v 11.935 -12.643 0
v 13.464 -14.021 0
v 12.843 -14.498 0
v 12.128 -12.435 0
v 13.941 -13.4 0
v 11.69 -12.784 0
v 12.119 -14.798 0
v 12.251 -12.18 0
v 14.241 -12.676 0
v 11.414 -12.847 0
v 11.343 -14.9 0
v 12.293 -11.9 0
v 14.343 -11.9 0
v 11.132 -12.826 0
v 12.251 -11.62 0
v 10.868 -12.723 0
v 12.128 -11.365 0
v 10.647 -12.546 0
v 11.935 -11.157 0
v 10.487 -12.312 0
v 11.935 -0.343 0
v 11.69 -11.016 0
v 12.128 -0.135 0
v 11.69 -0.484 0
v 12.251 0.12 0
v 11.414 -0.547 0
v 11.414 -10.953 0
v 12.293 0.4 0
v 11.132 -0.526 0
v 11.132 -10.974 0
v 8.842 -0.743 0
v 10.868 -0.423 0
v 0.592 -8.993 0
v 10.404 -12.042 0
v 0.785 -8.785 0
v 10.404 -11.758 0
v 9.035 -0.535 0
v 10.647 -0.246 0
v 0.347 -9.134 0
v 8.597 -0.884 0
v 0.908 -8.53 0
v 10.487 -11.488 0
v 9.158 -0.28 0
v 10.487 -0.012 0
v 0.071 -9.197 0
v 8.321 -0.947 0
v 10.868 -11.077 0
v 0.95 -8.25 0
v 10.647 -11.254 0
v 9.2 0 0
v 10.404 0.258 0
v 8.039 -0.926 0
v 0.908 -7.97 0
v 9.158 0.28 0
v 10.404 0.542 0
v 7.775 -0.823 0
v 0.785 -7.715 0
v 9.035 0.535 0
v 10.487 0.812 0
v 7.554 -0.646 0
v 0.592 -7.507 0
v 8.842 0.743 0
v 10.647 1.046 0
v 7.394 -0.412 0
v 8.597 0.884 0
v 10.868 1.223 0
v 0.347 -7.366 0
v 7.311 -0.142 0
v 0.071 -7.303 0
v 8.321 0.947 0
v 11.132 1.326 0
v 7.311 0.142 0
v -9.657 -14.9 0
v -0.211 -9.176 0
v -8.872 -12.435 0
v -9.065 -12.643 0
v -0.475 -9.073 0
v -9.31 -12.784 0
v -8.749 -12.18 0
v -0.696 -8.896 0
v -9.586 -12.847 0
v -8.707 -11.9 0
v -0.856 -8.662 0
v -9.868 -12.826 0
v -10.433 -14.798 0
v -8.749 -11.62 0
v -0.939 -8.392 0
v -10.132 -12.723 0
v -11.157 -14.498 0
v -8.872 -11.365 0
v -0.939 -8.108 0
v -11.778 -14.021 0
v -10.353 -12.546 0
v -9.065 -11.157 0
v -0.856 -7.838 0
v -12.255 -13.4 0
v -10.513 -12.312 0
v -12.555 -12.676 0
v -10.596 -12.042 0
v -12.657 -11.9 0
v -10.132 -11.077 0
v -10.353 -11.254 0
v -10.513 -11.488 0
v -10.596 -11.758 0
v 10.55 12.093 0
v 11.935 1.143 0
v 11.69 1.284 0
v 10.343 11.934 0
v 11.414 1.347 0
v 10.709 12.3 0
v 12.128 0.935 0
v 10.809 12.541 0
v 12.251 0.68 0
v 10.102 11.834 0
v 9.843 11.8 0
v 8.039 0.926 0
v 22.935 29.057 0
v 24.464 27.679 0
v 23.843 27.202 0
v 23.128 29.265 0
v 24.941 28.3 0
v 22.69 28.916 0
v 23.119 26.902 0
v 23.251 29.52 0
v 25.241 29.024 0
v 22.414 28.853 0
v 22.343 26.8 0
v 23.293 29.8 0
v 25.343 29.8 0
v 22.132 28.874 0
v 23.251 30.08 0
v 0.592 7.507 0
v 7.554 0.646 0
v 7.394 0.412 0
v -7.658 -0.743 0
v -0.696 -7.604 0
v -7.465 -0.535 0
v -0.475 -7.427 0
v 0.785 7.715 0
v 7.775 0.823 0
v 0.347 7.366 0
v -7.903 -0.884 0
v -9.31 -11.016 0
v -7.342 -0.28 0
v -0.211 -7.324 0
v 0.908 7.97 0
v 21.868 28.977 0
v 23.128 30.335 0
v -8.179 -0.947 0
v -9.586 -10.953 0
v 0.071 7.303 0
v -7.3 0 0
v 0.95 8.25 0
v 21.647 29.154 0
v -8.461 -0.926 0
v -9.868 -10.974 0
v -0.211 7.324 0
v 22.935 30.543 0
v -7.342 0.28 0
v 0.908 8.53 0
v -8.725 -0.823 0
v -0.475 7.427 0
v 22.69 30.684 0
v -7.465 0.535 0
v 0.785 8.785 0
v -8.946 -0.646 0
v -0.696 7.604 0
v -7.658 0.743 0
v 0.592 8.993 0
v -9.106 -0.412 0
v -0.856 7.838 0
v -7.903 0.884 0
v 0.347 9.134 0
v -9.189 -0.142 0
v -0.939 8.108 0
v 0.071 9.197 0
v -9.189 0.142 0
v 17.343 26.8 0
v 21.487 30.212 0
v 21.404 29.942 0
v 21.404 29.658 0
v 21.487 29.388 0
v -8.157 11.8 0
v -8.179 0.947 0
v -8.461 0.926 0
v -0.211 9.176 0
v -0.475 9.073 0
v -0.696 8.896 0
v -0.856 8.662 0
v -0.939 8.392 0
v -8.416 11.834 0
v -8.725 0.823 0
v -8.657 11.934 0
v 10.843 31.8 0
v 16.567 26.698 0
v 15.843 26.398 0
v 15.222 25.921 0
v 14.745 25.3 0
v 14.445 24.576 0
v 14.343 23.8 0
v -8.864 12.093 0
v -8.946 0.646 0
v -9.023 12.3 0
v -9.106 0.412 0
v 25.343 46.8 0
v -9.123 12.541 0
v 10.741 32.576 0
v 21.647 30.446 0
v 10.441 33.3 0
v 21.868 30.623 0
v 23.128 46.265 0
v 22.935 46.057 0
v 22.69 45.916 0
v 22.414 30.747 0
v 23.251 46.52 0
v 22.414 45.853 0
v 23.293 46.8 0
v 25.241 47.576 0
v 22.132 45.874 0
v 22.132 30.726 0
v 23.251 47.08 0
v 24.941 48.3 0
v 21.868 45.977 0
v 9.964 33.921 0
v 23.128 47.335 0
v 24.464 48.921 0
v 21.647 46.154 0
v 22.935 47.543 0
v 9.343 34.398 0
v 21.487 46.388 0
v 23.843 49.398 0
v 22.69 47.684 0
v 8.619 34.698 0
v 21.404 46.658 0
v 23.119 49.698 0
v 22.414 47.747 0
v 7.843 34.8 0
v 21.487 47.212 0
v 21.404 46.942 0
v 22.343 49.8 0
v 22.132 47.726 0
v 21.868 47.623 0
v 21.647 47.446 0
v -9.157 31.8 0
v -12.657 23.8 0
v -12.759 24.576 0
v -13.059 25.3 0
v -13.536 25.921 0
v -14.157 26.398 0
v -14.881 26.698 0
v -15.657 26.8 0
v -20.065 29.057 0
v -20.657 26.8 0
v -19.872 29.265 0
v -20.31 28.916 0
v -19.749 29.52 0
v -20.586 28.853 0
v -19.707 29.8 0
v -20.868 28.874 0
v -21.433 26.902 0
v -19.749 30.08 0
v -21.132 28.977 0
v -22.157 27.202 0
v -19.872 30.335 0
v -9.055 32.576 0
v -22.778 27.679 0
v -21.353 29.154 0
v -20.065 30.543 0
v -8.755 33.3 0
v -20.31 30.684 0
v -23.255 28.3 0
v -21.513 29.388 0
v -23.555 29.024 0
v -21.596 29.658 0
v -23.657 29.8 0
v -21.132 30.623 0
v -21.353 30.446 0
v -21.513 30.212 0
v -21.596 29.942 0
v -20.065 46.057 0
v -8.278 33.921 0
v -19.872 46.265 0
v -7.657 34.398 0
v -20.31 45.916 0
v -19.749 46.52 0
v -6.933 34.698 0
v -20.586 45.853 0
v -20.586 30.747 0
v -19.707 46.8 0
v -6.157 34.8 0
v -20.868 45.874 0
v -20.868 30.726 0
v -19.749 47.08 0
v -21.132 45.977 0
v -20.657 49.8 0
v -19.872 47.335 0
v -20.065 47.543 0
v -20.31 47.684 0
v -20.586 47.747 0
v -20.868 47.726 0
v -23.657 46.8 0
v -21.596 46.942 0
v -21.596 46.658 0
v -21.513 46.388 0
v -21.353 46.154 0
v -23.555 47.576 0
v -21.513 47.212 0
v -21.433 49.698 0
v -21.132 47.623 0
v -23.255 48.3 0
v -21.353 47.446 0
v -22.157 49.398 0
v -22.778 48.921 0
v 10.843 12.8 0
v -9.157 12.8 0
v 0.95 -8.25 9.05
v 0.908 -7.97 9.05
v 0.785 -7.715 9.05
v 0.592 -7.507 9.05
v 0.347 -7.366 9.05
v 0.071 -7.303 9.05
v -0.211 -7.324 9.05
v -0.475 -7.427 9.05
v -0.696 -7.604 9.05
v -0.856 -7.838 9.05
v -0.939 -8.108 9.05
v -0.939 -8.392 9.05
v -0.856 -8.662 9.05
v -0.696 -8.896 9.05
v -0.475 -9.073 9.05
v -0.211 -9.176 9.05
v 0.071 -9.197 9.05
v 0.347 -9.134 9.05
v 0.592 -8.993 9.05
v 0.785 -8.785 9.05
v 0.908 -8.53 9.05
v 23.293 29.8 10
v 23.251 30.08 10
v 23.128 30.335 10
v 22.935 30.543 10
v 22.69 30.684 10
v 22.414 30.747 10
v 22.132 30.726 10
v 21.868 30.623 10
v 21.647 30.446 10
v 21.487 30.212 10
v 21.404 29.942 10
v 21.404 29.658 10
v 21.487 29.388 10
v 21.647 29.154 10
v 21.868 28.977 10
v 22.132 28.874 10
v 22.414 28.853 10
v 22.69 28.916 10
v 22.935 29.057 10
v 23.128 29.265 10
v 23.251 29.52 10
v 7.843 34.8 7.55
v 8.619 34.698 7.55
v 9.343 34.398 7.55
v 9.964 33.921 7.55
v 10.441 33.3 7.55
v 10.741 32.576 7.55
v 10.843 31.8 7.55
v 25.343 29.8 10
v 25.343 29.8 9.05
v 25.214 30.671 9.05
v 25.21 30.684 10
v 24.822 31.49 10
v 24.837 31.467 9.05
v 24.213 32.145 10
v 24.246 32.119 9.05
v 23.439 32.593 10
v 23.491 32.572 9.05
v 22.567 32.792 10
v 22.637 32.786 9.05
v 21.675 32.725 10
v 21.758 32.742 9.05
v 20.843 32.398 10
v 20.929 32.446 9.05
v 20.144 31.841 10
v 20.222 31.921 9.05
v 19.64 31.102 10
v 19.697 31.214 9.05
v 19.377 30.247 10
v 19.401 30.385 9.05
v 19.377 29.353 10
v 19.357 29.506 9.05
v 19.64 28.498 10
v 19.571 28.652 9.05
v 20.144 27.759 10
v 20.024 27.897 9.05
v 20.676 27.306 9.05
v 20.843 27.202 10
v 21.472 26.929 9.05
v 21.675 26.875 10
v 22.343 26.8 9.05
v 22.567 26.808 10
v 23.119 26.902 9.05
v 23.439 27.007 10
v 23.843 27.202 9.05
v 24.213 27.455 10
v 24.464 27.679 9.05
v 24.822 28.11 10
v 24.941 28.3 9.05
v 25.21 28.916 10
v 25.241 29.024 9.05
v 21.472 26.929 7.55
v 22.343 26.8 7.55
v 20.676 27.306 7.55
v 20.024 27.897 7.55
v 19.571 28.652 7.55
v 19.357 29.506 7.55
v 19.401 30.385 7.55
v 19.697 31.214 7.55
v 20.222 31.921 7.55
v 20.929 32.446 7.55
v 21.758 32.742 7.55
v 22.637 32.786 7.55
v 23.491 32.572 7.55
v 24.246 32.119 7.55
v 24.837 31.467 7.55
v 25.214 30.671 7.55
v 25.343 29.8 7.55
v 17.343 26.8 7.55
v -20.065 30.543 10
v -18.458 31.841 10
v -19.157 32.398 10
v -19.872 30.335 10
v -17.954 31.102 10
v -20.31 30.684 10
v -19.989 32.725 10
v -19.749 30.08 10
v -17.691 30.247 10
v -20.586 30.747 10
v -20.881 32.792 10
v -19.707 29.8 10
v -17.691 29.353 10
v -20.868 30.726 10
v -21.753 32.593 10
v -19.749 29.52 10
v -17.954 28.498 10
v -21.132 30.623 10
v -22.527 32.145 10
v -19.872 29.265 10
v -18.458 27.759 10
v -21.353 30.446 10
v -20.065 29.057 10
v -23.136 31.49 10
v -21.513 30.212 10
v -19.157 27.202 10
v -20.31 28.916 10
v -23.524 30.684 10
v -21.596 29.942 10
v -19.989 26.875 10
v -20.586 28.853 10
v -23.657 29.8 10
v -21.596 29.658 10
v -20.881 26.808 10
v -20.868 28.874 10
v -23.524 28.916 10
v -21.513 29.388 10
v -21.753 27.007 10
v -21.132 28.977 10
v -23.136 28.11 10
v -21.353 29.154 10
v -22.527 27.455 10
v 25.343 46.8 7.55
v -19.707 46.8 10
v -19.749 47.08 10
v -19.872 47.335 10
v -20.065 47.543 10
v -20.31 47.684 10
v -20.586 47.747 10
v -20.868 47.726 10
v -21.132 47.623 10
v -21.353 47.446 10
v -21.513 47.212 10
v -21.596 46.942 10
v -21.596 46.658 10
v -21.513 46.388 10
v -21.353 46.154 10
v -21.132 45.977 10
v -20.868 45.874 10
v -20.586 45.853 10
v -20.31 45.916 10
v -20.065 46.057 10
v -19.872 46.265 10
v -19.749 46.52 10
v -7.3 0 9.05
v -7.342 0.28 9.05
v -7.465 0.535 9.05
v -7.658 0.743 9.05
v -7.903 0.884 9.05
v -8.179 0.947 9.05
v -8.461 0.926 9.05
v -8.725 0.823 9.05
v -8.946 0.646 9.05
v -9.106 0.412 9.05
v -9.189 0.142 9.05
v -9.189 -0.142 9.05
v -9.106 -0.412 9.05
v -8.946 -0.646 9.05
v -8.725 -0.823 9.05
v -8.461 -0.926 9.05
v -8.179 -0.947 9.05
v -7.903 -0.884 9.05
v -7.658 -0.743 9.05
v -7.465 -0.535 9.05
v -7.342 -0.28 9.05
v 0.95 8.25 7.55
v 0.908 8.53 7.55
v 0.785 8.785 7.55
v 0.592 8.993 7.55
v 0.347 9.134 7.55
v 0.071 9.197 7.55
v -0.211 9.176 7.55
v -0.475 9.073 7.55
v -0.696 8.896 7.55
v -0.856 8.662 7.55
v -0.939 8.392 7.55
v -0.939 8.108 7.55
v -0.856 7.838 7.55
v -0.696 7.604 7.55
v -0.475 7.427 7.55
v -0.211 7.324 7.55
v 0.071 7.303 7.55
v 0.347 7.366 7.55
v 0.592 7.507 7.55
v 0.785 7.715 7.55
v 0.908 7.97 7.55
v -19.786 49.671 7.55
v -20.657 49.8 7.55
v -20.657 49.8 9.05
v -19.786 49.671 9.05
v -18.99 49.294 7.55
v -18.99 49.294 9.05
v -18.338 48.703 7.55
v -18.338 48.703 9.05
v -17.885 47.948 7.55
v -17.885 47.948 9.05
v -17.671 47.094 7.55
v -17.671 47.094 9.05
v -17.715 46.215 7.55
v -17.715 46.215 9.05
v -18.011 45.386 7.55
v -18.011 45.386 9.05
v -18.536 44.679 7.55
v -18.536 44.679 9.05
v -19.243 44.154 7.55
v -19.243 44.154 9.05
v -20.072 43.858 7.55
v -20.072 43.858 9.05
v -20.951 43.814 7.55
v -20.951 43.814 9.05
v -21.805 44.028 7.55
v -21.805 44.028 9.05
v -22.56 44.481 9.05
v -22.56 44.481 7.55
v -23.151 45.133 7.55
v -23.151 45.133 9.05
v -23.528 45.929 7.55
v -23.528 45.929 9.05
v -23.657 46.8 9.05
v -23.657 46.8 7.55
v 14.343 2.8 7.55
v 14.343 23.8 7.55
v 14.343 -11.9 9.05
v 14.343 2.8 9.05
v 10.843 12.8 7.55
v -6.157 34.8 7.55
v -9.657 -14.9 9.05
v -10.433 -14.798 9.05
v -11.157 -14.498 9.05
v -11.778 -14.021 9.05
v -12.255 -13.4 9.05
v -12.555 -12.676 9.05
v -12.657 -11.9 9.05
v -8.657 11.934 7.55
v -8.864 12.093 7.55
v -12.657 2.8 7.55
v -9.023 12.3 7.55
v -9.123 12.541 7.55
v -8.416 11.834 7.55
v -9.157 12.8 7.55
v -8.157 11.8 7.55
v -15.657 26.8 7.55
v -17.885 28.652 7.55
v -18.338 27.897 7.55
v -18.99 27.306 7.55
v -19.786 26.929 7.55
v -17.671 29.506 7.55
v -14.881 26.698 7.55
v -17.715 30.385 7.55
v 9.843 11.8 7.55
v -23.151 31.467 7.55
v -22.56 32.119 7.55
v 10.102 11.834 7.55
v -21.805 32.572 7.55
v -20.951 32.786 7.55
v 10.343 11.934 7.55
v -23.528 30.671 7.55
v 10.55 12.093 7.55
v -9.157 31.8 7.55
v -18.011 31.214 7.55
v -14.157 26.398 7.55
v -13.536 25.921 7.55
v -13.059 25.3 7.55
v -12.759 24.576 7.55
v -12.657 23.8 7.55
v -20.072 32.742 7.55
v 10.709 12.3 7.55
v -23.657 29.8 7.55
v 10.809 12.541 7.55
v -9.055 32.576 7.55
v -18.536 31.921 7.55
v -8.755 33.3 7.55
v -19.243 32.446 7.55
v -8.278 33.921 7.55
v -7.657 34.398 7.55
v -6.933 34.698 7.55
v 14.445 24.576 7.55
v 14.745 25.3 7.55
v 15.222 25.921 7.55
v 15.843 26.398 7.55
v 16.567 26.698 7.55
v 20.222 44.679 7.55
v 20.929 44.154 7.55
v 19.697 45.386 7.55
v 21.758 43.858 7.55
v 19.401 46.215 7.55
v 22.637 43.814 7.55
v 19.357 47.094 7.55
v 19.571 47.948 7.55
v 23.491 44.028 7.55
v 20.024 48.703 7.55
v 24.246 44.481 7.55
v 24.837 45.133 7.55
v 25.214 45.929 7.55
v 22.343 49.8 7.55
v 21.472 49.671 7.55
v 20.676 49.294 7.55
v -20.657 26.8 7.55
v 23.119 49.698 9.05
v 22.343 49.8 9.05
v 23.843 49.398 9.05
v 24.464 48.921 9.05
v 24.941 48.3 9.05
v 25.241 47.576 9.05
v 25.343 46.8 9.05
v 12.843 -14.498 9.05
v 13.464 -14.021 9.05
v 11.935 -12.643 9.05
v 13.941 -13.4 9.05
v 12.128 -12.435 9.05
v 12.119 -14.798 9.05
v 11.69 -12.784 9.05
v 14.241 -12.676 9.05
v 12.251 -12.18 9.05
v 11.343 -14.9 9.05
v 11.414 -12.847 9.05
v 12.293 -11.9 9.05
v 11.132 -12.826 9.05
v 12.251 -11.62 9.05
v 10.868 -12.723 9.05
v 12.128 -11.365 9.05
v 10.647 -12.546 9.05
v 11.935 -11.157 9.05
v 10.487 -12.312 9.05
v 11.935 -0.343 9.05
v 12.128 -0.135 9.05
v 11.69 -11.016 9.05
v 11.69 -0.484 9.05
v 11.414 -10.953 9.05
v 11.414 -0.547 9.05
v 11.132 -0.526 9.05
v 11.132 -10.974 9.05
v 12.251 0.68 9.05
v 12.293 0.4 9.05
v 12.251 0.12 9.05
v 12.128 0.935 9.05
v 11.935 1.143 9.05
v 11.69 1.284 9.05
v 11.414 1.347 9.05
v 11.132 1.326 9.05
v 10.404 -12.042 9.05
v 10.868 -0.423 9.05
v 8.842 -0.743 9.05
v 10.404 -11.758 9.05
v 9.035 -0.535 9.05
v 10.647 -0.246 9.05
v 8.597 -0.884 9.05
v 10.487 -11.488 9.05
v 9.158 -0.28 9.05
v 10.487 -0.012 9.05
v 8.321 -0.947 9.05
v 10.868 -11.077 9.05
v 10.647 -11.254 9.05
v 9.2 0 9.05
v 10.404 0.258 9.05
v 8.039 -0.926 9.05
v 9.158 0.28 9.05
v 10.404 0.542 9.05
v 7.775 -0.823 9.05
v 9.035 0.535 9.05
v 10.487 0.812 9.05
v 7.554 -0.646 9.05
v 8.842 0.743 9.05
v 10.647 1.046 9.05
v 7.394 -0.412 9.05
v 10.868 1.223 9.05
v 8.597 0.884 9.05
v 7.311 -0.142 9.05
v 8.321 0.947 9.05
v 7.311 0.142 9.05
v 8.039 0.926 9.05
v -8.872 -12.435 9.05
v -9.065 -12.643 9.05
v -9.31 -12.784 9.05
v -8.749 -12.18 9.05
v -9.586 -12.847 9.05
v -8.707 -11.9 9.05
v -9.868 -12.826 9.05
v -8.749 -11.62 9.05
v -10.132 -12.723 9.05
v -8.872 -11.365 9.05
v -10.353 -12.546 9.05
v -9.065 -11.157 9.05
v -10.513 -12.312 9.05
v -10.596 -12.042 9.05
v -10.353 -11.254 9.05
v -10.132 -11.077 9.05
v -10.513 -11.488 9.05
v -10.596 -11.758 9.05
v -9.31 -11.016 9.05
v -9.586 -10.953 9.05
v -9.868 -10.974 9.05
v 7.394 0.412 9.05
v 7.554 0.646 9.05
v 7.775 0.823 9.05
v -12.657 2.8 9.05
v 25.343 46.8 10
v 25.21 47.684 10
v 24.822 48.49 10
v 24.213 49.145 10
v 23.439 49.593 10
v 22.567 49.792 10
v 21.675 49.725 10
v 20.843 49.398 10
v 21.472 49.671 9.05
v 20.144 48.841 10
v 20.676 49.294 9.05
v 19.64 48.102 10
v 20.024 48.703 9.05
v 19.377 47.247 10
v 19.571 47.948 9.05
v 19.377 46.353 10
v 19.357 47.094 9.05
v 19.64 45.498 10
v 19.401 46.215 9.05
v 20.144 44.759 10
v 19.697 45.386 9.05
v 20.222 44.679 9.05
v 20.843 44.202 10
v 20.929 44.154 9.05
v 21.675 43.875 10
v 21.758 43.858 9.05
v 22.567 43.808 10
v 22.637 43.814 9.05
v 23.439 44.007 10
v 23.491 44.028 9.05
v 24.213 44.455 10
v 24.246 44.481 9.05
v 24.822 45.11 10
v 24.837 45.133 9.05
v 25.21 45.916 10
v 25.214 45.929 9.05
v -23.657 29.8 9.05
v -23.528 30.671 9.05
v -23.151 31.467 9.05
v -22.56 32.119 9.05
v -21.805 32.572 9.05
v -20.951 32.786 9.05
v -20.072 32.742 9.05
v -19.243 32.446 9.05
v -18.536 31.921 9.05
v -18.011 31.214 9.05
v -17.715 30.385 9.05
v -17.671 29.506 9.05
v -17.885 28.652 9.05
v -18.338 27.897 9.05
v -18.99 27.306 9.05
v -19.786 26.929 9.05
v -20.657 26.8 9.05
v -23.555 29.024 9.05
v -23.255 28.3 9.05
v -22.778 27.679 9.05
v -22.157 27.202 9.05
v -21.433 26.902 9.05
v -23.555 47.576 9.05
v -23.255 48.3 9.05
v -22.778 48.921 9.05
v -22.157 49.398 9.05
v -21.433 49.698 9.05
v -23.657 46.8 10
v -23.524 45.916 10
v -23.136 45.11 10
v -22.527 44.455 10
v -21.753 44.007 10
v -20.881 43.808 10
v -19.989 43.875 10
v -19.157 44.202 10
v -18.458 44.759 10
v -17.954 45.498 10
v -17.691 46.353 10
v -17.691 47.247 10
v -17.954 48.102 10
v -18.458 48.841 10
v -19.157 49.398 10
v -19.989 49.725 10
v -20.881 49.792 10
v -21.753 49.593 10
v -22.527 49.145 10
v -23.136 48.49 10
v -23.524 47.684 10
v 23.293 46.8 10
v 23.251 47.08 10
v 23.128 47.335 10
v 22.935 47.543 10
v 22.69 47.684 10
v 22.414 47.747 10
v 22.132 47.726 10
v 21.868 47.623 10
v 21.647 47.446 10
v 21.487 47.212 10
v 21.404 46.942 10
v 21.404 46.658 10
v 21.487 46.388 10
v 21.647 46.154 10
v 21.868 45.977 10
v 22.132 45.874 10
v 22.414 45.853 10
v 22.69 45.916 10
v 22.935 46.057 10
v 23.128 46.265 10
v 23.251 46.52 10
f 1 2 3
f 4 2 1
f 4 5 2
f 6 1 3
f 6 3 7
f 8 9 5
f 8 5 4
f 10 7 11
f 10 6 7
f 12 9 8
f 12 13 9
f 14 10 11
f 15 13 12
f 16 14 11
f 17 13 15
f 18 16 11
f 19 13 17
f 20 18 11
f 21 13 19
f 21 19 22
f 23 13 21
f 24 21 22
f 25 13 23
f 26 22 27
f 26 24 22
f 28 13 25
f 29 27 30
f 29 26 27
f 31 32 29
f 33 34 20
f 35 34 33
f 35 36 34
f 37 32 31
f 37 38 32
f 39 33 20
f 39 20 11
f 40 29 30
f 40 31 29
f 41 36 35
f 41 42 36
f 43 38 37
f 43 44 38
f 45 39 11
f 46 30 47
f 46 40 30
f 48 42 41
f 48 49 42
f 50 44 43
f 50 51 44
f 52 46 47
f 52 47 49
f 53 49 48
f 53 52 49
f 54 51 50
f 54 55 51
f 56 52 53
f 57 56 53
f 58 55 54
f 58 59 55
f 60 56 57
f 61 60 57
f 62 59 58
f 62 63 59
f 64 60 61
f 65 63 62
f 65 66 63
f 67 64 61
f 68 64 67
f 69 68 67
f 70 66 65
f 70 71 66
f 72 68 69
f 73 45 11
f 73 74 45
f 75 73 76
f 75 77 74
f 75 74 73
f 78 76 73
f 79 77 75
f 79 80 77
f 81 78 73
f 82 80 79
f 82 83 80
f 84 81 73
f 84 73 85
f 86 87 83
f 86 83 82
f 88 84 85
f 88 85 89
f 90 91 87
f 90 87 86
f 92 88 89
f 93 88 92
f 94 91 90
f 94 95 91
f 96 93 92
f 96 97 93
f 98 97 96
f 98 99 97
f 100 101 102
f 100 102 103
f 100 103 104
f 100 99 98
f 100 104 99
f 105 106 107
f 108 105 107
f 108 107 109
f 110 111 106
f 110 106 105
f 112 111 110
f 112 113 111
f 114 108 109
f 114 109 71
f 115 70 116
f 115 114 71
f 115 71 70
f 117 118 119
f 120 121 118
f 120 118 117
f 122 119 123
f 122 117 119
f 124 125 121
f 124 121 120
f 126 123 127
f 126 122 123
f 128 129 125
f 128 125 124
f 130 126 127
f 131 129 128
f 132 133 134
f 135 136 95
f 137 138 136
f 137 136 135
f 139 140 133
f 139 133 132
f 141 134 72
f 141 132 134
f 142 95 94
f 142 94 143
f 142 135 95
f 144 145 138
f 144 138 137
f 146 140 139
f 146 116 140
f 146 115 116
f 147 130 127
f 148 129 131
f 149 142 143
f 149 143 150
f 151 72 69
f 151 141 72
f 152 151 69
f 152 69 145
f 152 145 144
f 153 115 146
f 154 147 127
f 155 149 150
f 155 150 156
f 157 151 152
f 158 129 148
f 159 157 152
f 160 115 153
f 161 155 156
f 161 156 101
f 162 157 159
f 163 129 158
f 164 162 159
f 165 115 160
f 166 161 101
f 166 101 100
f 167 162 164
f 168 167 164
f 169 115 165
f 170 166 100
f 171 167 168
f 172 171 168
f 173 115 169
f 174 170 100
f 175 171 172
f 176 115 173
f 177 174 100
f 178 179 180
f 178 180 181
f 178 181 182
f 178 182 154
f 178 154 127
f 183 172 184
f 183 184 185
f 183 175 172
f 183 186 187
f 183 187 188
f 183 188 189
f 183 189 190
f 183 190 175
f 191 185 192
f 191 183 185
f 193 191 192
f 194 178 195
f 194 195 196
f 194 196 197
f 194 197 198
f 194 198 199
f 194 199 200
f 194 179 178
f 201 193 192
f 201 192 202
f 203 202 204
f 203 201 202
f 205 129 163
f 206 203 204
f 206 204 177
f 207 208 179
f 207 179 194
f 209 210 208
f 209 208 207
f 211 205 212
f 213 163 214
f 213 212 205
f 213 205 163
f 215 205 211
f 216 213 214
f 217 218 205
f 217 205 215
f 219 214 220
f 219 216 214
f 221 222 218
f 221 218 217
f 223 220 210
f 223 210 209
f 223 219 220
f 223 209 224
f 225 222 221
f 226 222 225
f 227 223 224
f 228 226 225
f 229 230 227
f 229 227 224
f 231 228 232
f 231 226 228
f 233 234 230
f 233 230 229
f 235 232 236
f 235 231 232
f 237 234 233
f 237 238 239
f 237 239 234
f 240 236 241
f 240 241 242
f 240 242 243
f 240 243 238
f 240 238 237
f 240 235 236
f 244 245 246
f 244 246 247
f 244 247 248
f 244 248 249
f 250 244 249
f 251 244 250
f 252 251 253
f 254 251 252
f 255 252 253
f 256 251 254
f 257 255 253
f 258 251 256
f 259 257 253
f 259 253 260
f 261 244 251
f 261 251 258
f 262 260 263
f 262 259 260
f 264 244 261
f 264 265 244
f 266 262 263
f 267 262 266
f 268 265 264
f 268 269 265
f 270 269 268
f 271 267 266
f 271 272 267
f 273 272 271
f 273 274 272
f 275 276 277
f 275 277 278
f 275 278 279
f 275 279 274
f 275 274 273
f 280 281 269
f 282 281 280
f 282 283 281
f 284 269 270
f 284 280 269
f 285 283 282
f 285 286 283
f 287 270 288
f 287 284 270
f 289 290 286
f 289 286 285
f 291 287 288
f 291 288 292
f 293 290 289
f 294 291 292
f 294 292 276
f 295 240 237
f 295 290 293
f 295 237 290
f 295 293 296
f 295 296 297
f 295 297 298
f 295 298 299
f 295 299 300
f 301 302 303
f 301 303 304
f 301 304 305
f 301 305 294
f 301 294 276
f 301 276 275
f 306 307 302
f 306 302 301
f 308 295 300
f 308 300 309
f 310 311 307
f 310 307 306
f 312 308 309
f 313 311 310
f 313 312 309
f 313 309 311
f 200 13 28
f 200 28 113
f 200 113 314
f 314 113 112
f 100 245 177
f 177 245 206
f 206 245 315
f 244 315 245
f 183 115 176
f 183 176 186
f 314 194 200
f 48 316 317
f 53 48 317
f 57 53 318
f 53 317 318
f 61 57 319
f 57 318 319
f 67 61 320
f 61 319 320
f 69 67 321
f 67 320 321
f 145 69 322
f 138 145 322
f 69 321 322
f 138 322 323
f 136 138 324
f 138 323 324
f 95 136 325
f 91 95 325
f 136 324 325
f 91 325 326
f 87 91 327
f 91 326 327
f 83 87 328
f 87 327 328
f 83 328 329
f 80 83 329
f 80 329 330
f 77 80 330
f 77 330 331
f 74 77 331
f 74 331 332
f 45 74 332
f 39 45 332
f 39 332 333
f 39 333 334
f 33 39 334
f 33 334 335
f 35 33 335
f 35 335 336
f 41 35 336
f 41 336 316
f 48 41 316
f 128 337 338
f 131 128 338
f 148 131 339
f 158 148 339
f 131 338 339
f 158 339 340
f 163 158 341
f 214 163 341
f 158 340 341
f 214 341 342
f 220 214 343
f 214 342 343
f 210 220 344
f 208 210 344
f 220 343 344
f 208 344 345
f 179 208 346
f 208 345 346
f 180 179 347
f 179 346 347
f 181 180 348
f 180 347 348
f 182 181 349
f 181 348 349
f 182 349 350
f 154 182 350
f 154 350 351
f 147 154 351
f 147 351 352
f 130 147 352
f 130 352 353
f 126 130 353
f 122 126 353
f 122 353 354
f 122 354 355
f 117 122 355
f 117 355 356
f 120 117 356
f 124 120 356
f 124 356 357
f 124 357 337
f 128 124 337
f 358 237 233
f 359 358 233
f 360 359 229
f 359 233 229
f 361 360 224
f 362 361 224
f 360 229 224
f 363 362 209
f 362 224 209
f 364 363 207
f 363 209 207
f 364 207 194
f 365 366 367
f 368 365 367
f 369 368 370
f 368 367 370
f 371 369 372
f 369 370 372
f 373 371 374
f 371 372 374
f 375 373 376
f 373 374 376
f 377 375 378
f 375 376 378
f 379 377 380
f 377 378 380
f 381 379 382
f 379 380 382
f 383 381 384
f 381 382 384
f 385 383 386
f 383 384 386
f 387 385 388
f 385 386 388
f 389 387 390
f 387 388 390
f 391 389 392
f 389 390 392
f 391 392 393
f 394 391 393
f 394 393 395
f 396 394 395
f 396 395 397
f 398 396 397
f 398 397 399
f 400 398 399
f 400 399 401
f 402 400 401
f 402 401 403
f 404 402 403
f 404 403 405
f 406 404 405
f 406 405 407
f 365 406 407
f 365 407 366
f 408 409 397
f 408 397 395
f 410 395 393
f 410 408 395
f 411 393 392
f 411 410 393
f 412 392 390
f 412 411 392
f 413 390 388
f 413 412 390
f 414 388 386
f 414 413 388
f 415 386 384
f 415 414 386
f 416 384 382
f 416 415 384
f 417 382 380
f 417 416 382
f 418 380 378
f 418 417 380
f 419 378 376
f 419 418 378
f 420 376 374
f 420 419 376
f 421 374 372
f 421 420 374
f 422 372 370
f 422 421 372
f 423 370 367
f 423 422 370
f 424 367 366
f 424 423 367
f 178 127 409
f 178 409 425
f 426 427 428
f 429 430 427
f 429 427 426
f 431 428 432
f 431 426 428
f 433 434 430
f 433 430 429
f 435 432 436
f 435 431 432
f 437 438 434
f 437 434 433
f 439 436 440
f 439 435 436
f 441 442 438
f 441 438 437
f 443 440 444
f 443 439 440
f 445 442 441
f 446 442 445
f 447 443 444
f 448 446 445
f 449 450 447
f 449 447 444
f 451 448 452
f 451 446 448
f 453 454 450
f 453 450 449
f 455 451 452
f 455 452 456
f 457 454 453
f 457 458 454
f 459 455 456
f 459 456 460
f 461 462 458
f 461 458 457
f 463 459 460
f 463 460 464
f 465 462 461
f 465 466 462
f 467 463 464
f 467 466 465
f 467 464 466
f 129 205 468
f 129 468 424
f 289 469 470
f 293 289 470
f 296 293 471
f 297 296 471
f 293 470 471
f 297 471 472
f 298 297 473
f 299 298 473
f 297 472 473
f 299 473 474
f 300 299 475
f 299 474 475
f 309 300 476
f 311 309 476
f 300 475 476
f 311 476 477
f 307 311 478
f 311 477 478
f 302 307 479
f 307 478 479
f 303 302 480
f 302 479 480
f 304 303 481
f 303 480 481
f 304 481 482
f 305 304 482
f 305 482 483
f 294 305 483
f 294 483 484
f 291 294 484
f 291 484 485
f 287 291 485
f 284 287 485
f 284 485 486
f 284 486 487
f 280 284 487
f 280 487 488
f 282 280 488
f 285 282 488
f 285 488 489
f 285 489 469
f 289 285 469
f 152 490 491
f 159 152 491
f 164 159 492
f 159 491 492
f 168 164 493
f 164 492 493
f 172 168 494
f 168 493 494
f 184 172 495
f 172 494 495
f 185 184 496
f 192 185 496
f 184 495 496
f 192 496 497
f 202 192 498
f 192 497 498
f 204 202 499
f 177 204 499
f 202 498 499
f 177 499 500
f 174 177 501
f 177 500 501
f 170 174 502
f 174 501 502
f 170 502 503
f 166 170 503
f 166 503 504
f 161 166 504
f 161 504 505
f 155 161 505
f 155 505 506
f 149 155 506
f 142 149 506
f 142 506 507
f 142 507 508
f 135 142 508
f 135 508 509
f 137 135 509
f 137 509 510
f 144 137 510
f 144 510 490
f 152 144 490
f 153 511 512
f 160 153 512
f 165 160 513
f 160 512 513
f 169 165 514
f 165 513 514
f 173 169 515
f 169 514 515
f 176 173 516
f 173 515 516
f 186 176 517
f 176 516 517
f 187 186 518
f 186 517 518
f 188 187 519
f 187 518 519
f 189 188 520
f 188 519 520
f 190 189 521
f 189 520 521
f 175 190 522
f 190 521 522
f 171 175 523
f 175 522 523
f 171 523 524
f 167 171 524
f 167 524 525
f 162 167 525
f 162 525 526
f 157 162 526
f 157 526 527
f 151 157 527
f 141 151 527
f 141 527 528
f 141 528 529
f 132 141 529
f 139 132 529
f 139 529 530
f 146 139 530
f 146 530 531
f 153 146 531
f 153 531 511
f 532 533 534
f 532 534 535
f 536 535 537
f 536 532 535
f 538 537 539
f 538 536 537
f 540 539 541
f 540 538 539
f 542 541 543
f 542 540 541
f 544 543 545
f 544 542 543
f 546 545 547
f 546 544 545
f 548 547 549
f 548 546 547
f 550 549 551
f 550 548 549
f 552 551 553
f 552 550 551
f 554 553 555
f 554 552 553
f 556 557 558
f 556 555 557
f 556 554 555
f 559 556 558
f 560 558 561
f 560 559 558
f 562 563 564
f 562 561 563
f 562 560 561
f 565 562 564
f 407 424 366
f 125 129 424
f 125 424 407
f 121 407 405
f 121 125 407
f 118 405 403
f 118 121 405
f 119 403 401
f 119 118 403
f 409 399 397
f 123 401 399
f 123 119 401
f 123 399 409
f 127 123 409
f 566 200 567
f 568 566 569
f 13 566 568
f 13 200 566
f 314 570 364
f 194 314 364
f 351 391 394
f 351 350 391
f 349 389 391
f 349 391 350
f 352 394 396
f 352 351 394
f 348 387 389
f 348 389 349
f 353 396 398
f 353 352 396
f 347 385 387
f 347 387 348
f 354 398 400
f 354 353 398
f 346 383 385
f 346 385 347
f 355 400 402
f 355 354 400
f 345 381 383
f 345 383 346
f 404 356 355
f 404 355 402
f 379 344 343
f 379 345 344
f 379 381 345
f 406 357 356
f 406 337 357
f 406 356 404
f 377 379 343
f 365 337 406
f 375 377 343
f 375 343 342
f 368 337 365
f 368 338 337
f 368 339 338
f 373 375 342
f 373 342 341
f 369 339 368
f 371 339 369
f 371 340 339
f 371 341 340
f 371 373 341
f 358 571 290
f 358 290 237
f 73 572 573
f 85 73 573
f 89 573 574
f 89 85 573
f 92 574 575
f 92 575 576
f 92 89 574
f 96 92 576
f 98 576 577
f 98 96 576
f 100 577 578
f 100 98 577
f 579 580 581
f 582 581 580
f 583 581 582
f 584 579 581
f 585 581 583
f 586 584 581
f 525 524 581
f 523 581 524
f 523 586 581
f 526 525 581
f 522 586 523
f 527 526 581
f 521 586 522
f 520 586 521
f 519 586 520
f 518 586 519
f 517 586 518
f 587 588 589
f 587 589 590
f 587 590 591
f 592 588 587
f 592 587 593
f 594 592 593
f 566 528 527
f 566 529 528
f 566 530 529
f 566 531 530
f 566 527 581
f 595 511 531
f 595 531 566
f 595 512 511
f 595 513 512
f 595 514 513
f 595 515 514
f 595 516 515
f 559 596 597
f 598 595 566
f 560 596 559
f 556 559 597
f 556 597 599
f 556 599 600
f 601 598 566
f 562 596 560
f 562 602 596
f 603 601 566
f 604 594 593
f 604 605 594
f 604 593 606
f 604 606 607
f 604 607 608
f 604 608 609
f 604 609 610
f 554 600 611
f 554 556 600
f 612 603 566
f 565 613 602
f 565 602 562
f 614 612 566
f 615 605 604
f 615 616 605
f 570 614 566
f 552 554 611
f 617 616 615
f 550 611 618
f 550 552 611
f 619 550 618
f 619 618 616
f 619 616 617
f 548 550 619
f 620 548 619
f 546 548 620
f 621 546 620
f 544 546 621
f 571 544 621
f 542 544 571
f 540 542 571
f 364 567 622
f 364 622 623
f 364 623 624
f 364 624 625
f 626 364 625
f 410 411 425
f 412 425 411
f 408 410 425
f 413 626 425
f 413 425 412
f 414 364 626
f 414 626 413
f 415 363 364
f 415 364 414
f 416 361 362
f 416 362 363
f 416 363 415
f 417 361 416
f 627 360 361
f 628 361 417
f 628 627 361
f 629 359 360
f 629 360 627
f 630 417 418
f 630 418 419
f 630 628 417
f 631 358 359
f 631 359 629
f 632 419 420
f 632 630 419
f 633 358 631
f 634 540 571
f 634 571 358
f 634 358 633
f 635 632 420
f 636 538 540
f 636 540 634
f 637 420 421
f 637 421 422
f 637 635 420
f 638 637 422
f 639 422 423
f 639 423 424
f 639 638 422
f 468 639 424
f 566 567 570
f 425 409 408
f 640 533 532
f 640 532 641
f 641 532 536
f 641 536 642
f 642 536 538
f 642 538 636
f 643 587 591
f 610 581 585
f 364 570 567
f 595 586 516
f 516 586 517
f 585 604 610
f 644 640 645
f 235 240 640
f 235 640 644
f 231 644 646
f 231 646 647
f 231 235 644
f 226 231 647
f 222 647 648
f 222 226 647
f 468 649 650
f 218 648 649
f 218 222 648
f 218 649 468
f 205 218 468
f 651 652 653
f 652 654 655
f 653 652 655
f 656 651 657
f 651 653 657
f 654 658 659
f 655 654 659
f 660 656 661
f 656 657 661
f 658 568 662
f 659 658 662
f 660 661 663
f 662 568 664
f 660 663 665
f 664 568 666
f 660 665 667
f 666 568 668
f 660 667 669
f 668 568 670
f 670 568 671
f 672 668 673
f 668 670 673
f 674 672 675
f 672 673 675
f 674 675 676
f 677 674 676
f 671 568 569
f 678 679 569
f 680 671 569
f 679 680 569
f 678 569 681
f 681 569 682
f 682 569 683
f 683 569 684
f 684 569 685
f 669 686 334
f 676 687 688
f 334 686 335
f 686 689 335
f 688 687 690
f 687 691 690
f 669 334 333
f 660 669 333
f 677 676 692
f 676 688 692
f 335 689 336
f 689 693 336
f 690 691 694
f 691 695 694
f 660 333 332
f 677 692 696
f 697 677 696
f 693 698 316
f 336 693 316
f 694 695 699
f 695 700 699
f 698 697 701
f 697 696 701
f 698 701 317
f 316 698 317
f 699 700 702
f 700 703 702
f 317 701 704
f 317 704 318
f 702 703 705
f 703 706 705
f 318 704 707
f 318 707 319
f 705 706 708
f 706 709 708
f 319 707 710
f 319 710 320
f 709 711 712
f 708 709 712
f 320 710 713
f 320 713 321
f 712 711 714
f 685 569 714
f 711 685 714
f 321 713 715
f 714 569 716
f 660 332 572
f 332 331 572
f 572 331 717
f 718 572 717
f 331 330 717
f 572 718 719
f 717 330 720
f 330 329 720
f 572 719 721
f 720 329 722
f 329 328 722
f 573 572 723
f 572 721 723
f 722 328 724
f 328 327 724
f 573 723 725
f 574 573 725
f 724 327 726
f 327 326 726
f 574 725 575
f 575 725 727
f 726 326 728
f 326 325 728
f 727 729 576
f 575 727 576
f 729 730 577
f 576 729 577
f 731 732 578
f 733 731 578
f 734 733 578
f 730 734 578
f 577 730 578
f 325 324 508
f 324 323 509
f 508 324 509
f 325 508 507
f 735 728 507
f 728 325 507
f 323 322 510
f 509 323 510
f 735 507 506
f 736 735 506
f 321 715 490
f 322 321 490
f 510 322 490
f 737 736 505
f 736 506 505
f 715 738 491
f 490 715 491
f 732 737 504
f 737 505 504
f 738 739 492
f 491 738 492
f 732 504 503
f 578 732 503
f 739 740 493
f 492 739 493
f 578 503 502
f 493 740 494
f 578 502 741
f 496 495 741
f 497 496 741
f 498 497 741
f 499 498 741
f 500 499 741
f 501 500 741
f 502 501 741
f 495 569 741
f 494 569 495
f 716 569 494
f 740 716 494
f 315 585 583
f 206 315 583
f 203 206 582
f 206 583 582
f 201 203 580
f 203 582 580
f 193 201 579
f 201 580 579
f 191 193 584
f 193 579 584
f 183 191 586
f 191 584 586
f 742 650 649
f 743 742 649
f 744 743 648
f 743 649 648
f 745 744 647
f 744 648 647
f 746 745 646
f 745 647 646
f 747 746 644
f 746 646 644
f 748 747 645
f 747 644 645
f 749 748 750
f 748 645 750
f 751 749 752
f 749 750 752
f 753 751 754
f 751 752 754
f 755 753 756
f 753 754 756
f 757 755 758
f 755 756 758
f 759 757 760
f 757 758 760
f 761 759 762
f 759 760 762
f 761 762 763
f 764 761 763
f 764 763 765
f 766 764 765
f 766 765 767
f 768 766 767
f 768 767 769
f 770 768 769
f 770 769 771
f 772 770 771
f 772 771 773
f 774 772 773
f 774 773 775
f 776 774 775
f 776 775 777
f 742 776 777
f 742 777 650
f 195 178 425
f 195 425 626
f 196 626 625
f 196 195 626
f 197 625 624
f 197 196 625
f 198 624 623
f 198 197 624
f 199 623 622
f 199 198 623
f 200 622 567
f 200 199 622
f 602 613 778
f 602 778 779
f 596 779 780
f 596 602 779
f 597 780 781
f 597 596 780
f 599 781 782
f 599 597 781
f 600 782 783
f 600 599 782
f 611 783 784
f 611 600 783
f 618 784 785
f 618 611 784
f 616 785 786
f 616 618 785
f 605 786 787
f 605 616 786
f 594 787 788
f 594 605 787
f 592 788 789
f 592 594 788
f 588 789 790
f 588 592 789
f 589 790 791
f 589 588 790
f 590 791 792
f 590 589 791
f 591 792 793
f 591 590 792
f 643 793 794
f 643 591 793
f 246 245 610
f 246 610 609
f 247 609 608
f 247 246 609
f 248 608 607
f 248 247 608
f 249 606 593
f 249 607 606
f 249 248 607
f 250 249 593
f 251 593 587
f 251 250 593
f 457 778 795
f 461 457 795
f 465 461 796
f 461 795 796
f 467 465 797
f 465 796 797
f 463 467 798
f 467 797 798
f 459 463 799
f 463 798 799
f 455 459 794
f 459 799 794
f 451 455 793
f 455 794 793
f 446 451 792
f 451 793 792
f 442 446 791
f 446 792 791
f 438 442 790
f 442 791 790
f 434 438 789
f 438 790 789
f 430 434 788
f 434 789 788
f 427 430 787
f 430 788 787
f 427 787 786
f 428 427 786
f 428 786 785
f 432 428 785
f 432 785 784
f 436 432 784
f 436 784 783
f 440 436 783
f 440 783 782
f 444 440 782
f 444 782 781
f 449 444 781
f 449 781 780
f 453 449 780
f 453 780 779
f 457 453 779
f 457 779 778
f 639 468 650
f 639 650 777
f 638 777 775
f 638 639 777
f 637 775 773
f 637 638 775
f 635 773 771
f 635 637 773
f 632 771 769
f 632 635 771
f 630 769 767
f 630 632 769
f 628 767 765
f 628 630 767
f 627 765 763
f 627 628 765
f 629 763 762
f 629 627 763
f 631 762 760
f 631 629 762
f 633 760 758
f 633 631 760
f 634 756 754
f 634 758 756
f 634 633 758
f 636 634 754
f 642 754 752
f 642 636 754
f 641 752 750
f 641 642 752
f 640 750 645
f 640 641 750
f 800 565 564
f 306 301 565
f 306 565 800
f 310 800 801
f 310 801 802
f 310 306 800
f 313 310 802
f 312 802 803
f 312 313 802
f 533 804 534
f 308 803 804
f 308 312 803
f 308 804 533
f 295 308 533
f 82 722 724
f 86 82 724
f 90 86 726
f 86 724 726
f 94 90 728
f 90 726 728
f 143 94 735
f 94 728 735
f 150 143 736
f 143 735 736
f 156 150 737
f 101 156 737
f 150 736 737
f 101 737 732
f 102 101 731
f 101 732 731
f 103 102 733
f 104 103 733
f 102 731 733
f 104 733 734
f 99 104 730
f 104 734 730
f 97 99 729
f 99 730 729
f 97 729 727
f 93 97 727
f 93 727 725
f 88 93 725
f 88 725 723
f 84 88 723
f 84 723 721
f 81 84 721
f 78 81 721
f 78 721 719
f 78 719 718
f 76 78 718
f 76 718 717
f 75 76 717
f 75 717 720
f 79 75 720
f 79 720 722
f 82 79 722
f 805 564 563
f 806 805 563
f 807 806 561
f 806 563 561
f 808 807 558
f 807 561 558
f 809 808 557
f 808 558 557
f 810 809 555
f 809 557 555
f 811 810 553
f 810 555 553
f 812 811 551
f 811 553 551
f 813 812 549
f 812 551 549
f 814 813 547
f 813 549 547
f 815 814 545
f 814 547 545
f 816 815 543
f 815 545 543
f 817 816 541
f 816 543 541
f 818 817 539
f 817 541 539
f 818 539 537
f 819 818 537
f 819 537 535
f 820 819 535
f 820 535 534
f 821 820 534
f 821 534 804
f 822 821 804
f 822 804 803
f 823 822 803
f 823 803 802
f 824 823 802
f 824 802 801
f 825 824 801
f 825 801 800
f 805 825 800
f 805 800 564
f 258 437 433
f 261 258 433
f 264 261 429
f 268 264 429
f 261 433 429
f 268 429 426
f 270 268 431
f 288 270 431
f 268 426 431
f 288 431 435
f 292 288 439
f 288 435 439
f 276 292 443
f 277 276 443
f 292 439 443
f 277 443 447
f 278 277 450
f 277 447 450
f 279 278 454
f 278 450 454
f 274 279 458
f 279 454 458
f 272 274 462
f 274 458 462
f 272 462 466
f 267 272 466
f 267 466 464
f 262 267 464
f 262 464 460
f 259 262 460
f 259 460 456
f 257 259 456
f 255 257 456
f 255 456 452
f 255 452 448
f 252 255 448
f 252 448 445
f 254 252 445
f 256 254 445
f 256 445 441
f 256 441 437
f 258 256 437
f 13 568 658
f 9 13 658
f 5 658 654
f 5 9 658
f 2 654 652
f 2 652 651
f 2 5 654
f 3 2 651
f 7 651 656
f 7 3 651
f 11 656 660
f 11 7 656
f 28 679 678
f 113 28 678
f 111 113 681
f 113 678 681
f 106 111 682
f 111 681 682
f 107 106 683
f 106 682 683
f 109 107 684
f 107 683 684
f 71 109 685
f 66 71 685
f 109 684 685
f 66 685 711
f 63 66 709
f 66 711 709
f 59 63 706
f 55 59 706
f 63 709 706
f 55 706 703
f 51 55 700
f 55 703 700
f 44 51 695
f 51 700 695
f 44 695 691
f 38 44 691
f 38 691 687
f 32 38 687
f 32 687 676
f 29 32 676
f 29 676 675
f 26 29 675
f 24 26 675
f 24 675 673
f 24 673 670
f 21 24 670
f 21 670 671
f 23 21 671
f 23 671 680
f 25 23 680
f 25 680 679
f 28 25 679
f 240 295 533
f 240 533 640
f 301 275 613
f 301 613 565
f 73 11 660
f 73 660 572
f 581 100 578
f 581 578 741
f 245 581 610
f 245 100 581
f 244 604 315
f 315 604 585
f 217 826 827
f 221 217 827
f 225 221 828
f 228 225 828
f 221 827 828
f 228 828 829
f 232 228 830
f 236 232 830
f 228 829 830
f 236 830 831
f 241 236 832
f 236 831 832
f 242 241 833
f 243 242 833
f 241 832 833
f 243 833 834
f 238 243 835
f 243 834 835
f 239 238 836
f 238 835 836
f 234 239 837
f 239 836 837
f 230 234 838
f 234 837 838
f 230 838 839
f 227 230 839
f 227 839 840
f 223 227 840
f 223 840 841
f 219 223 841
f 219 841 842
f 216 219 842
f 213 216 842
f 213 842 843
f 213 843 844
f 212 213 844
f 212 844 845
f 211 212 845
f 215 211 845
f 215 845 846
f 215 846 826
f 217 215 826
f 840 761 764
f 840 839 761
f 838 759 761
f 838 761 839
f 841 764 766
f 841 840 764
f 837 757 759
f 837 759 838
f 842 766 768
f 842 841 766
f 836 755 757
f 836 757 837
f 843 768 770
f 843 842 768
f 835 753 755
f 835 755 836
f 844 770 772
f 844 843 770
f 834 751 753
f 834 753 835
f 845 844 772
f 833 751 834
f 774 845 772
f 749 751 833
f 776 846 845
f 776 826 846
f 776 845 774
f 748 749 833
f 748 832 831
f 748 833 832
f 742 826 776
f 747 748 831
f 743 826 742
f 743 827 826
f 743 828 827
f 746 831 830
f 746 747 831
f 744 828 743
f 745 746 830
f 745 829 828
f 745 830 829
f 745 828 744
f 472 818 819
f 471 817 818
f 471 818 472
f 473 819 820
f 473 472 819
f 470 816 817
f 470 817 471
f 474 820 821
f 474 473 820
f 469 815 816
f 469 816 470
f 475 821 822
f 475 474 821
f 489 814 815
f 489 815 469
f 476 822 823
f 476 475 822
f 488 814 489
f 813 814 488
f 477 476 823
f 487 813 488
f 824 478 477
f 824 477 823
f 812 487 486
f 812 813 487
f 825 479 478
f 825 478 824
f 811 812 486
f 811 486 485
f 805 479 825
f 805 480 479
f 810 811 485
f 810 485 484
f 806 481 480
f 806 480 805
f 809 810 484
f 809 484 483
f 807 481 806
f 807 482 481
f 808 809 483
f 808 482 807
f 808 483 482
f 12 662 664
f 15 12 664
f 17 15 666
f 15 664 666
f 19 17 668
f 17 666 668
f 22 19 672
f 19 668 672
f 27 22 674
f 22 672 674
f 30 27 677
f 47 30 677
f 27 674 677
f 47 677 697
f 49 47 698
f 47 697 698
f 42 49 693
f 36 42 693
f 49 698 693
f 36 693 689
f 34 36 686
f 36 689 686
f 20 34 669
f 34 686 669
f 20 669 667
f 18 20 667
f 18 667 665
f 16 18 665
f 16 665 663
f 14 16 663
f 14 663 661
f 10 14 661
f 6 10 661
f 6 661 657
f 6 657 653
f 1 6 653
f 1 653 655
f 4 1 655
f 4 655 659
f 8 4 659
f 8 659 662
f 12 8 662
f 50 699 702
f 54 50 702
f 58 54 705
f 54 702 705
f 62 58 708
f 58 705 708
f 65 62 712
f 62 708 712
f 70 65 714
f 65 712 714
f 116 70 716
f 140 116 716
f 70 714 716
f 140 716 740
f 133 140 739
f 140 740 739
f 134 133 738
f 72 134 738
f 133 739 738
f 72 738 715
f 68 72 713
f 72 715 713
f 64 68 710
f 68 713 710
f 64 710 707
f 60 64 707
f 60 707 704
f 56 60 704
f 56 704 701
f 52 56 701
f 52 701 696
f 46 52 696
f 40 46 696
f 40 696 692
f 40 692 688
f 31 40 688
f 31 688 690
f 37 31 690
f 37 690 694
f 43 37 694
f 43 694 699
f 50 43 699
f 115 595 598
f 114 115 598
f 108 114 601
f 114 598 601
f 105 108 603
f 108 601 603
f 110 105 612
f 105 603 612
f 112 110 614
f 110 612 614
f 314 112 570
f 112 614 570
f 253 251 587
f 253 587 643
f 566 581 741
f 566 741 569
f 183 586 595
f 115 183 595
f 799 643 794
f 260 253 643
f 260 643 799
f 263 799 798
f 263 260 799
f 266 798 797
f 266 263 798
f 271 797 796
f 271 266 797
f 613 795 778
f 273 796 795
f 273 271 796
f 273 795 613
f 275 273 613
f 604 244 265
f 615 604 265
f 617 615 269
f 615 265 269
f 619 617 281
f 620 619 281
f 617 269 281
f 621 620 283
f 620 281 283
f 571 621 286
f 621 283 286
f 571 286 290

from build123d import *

# Parameters (mm, degrees)
BOSS_EXTRUDE1_DEPTH = 9.05
SKETCH2_W           = 20
SKETCH2_H           = 10
CUT_EXTRUDE1_DEPTH  = 57.605743
FILLET1_R           = 3
SKETCH4_R           = 3
BOSS_EXTRUDE2_DEPTH = 0.95
CUT_EXTRUDE2_START  = -1.5
CUT_EXTRUDE2_DEPTH  = 1.5
SKETCH5_R           = 0.95
CUT_EXTRUDE3_DEPTH  = 57.765374


with BuildPart() as part:
    # Sketch1 → Boss-Extrude1 (new body)
    with BuildSketch(Plane.XY):
        with BuildLine():
            Line((-23.657, 29.8), (-23.657, 46.8))
            ThreePointArc((-23.657, 46.8), (-22.77832, 48.92132), (-20.657, 49.8))
            Line((-20.657, 49.8), (22.343, 49.8))
            ThreePointArc((22.343, 49.8), (24.46432, 48.92132), (25.343, 46.8))
            Line((25.343, 46.8), (25.343, 29.8))
            ThreePointArc((25.343, 29.8), (24.46432, 27.67868), (22.343, 26.8))
            Line((22.343, 26.8), (17.343, 26.8))
            ThreePointArc((17.343, 26.8), (15.22168, 25.92132), (14.343, 23.8))
            Line((14.343, 23.8), (14.343, -11.9))
            ThreePointArc((14.343, -11.9), (13.46432, -14.02132), (11.343, -14.9))
            Line((11.343, -14.9), (-9.657, -14.9))
            ThreePointArc((-9.657, -14.9), (-11.77832, -14.02132), (-12.657, -11.9))
            Line((-12.657, -11.9), (-12.657, 23.8))
            ThreePointArc((-12.657, 23.8), (-13.53568, 25.92132), (-15.657, 26.8))
            Line((-15.657, 26.8), (-20.657, 26.8))
            ThreePointArc((-20.657, 26.8), (-22.77832, 27.67868), (-23.657, 29.8))
        make_face()
    extrude(amount=BOSS_EXTRUDE1_DEPTH)

    # Sketch2 → Cut-Extrude1 (cut, through all)
    with BuildSketch(Plane.XY.offset(9.05)):
        with BuildLine():
            Line((-8.157, 11.8), (9.843, 11.8))
            ThreePointArc((9.843, 11.8), (10.550107, 12.092893), (10.843, 12.8))
            Line((10.843, 12.8), (10.843, 24.8))
            Line((10.843, 24.8), (-9.157, 24.8))
            Line((-9.157, 24.8), (-9.157, 12.8))
            ThreePointArc((-9.157, 12.8), (-8.864107, 12.092893), (-8.157, 11.8))
        make_face()
        with Locations((0.843, 29.8)):
            Rectangle(SKETCH2_W, SKETCH2_H)
    extrude(amount=-CUT_EXTRUDE1_DEPTH, mode=Mode.SUBTRACT)

    # Fillet1
    fillet1_edges = [part.edges().sort_by_distance(p)[0] for p in [
        (-9.157, 34.8, 4.525),
        (10.843, 34.8, 4.525),
    ]]
    fillet(fillet1_edges, radius=FILLET1_R)

    # Sketch4 → Boss-Extrude2 (add)
    with BuildSketch(Plane.XY.offset(9.05)):
        with Locations((22.343, 29.8)):
            Circle(SKETCH4_R)
        with Locations((22.343, 46.8)):
            Circle(SKETCH4_R)
        with Locations(Location((-20.657, 46.8, 0), (0, 0, 180))):
            Circle(SKETCH4_R)
        with Locations(Location((-20.657, 29.8, 0), (0, 0, 180))):
            Circle(SKETCH4_R)
    extrude(amount=BOSS_EXTRUDE2_DEPTH)

    # Sketch3 → Cut-Extrude2 (cut)
    with BuildSketch(Plane.XY.offset(9.05).offset(CUT_EXTRUDE2_START)):
        with BuildLine():
            Line((-12.657, 2.8), (14.343, 2.8))
            Line((14.343, 2.8), (14.343, 23.8))
            ThreePointArc((14.343, 23.8), (15.22168, 25.92132), (17.343, 26.8))
            Line((17.343, 26.8), (22.343, 26.8))
            ThreePointArc((22.343, 26.8), (20.22168, 31.92132), (25.343, 29.8))
            Line((25.343, 29.8), (25.343, 46.8))
            ThreePointArc((25.343, 46.8), (20.22168, 44.67868), (22.343, 49.8))
            Line((22.343, 49.8), (-20.657, 49.8))
            ThreePointArc((-20.657, 49.8), (-18.53568, 44.67868), (-23.657, 46.8))
            Line((-23.657, 46.8), (-23.657, 29.8))
            ThreePointArc((-23.657, 29.8), (-18.53568, 31.92132), (-20.657, 26.8))
            Line((-20.657, 26.8), (-15.657, 26.8))
            ThreePointArc((-15.657, 26.8), (-13.53568, 25.92132), (-12.657, 23.8))
            Line((-12.657, 23.8), (-12.657, 2.8))
        make_face()
        with BuildLine():
            Line((10.843, 31.8), (10.843, 12.8))
            ThreePointArc((10.843, 12.8), (10.550107, 12.092893), (9.843, 11.8))
            Line((9.843, 11.8), (-8.157, 11.8))
            ThreePointArc((-8.157, 11.8), (-8.864107, 12.092893), (-9.157, 12.8))
            Line((-9.157, 12.8), (-9.157, 31.8))
            ThreePointArc((-9.157, 31.8), (-8.27832, 33.92132), (-6.157, 34.8))
            Line((-6.157, 34.8), (7.843, 34.8))
            ThreePointArc((7.843, 34.8), (9.96432, 33.92132), (10.843, 31.8))
        make_face(mode=Mode.SUBTRACT)
    extrude(amount=CUT_EXTRUDE2_DEPTH, mode=Mode.SUBTRACT)

    # Sketch5 → Cut-Extrude3 (cut, through all)
    with BuildSketch(Plane.XY.offset(10)):
        with Locations((22.343, 46.8)):
            Circle(SKETCH5_R)
        with Locations((22.343, 29.8)):
            Circle(SKETCH5_R)
        with Locations((-20.657, 46.8)):
            Circle(SKETCH5_R)
        with Locations((-20.657, 29.8)):
            Circle(SKETCH5_R)
        with Locations((-9.657, -11.9)):
            Circle(SKETCH5_R)
        with Locations((11.343, -11.9)):
            Circle(SKETCH5_R)
        with Locations((11.343, 0.4)):
            Circle(SKETCH5_R)
        with Locations((0, 8.25)):
            Circle(SKETCH5_R)
        with Locations((-8.25, 0)):
            Circle(SKETCH5_R)
        with Locations((8.25, 0)):
            Circle(SKETCH5_R)
        with Locations((0, -8.25)):
            Circle(SKETCH5_R)
    extrude(amount=-CUT_EXTRUDE3_DEPTH, mode=Mode.SUBTRACT)


solid = part.part
